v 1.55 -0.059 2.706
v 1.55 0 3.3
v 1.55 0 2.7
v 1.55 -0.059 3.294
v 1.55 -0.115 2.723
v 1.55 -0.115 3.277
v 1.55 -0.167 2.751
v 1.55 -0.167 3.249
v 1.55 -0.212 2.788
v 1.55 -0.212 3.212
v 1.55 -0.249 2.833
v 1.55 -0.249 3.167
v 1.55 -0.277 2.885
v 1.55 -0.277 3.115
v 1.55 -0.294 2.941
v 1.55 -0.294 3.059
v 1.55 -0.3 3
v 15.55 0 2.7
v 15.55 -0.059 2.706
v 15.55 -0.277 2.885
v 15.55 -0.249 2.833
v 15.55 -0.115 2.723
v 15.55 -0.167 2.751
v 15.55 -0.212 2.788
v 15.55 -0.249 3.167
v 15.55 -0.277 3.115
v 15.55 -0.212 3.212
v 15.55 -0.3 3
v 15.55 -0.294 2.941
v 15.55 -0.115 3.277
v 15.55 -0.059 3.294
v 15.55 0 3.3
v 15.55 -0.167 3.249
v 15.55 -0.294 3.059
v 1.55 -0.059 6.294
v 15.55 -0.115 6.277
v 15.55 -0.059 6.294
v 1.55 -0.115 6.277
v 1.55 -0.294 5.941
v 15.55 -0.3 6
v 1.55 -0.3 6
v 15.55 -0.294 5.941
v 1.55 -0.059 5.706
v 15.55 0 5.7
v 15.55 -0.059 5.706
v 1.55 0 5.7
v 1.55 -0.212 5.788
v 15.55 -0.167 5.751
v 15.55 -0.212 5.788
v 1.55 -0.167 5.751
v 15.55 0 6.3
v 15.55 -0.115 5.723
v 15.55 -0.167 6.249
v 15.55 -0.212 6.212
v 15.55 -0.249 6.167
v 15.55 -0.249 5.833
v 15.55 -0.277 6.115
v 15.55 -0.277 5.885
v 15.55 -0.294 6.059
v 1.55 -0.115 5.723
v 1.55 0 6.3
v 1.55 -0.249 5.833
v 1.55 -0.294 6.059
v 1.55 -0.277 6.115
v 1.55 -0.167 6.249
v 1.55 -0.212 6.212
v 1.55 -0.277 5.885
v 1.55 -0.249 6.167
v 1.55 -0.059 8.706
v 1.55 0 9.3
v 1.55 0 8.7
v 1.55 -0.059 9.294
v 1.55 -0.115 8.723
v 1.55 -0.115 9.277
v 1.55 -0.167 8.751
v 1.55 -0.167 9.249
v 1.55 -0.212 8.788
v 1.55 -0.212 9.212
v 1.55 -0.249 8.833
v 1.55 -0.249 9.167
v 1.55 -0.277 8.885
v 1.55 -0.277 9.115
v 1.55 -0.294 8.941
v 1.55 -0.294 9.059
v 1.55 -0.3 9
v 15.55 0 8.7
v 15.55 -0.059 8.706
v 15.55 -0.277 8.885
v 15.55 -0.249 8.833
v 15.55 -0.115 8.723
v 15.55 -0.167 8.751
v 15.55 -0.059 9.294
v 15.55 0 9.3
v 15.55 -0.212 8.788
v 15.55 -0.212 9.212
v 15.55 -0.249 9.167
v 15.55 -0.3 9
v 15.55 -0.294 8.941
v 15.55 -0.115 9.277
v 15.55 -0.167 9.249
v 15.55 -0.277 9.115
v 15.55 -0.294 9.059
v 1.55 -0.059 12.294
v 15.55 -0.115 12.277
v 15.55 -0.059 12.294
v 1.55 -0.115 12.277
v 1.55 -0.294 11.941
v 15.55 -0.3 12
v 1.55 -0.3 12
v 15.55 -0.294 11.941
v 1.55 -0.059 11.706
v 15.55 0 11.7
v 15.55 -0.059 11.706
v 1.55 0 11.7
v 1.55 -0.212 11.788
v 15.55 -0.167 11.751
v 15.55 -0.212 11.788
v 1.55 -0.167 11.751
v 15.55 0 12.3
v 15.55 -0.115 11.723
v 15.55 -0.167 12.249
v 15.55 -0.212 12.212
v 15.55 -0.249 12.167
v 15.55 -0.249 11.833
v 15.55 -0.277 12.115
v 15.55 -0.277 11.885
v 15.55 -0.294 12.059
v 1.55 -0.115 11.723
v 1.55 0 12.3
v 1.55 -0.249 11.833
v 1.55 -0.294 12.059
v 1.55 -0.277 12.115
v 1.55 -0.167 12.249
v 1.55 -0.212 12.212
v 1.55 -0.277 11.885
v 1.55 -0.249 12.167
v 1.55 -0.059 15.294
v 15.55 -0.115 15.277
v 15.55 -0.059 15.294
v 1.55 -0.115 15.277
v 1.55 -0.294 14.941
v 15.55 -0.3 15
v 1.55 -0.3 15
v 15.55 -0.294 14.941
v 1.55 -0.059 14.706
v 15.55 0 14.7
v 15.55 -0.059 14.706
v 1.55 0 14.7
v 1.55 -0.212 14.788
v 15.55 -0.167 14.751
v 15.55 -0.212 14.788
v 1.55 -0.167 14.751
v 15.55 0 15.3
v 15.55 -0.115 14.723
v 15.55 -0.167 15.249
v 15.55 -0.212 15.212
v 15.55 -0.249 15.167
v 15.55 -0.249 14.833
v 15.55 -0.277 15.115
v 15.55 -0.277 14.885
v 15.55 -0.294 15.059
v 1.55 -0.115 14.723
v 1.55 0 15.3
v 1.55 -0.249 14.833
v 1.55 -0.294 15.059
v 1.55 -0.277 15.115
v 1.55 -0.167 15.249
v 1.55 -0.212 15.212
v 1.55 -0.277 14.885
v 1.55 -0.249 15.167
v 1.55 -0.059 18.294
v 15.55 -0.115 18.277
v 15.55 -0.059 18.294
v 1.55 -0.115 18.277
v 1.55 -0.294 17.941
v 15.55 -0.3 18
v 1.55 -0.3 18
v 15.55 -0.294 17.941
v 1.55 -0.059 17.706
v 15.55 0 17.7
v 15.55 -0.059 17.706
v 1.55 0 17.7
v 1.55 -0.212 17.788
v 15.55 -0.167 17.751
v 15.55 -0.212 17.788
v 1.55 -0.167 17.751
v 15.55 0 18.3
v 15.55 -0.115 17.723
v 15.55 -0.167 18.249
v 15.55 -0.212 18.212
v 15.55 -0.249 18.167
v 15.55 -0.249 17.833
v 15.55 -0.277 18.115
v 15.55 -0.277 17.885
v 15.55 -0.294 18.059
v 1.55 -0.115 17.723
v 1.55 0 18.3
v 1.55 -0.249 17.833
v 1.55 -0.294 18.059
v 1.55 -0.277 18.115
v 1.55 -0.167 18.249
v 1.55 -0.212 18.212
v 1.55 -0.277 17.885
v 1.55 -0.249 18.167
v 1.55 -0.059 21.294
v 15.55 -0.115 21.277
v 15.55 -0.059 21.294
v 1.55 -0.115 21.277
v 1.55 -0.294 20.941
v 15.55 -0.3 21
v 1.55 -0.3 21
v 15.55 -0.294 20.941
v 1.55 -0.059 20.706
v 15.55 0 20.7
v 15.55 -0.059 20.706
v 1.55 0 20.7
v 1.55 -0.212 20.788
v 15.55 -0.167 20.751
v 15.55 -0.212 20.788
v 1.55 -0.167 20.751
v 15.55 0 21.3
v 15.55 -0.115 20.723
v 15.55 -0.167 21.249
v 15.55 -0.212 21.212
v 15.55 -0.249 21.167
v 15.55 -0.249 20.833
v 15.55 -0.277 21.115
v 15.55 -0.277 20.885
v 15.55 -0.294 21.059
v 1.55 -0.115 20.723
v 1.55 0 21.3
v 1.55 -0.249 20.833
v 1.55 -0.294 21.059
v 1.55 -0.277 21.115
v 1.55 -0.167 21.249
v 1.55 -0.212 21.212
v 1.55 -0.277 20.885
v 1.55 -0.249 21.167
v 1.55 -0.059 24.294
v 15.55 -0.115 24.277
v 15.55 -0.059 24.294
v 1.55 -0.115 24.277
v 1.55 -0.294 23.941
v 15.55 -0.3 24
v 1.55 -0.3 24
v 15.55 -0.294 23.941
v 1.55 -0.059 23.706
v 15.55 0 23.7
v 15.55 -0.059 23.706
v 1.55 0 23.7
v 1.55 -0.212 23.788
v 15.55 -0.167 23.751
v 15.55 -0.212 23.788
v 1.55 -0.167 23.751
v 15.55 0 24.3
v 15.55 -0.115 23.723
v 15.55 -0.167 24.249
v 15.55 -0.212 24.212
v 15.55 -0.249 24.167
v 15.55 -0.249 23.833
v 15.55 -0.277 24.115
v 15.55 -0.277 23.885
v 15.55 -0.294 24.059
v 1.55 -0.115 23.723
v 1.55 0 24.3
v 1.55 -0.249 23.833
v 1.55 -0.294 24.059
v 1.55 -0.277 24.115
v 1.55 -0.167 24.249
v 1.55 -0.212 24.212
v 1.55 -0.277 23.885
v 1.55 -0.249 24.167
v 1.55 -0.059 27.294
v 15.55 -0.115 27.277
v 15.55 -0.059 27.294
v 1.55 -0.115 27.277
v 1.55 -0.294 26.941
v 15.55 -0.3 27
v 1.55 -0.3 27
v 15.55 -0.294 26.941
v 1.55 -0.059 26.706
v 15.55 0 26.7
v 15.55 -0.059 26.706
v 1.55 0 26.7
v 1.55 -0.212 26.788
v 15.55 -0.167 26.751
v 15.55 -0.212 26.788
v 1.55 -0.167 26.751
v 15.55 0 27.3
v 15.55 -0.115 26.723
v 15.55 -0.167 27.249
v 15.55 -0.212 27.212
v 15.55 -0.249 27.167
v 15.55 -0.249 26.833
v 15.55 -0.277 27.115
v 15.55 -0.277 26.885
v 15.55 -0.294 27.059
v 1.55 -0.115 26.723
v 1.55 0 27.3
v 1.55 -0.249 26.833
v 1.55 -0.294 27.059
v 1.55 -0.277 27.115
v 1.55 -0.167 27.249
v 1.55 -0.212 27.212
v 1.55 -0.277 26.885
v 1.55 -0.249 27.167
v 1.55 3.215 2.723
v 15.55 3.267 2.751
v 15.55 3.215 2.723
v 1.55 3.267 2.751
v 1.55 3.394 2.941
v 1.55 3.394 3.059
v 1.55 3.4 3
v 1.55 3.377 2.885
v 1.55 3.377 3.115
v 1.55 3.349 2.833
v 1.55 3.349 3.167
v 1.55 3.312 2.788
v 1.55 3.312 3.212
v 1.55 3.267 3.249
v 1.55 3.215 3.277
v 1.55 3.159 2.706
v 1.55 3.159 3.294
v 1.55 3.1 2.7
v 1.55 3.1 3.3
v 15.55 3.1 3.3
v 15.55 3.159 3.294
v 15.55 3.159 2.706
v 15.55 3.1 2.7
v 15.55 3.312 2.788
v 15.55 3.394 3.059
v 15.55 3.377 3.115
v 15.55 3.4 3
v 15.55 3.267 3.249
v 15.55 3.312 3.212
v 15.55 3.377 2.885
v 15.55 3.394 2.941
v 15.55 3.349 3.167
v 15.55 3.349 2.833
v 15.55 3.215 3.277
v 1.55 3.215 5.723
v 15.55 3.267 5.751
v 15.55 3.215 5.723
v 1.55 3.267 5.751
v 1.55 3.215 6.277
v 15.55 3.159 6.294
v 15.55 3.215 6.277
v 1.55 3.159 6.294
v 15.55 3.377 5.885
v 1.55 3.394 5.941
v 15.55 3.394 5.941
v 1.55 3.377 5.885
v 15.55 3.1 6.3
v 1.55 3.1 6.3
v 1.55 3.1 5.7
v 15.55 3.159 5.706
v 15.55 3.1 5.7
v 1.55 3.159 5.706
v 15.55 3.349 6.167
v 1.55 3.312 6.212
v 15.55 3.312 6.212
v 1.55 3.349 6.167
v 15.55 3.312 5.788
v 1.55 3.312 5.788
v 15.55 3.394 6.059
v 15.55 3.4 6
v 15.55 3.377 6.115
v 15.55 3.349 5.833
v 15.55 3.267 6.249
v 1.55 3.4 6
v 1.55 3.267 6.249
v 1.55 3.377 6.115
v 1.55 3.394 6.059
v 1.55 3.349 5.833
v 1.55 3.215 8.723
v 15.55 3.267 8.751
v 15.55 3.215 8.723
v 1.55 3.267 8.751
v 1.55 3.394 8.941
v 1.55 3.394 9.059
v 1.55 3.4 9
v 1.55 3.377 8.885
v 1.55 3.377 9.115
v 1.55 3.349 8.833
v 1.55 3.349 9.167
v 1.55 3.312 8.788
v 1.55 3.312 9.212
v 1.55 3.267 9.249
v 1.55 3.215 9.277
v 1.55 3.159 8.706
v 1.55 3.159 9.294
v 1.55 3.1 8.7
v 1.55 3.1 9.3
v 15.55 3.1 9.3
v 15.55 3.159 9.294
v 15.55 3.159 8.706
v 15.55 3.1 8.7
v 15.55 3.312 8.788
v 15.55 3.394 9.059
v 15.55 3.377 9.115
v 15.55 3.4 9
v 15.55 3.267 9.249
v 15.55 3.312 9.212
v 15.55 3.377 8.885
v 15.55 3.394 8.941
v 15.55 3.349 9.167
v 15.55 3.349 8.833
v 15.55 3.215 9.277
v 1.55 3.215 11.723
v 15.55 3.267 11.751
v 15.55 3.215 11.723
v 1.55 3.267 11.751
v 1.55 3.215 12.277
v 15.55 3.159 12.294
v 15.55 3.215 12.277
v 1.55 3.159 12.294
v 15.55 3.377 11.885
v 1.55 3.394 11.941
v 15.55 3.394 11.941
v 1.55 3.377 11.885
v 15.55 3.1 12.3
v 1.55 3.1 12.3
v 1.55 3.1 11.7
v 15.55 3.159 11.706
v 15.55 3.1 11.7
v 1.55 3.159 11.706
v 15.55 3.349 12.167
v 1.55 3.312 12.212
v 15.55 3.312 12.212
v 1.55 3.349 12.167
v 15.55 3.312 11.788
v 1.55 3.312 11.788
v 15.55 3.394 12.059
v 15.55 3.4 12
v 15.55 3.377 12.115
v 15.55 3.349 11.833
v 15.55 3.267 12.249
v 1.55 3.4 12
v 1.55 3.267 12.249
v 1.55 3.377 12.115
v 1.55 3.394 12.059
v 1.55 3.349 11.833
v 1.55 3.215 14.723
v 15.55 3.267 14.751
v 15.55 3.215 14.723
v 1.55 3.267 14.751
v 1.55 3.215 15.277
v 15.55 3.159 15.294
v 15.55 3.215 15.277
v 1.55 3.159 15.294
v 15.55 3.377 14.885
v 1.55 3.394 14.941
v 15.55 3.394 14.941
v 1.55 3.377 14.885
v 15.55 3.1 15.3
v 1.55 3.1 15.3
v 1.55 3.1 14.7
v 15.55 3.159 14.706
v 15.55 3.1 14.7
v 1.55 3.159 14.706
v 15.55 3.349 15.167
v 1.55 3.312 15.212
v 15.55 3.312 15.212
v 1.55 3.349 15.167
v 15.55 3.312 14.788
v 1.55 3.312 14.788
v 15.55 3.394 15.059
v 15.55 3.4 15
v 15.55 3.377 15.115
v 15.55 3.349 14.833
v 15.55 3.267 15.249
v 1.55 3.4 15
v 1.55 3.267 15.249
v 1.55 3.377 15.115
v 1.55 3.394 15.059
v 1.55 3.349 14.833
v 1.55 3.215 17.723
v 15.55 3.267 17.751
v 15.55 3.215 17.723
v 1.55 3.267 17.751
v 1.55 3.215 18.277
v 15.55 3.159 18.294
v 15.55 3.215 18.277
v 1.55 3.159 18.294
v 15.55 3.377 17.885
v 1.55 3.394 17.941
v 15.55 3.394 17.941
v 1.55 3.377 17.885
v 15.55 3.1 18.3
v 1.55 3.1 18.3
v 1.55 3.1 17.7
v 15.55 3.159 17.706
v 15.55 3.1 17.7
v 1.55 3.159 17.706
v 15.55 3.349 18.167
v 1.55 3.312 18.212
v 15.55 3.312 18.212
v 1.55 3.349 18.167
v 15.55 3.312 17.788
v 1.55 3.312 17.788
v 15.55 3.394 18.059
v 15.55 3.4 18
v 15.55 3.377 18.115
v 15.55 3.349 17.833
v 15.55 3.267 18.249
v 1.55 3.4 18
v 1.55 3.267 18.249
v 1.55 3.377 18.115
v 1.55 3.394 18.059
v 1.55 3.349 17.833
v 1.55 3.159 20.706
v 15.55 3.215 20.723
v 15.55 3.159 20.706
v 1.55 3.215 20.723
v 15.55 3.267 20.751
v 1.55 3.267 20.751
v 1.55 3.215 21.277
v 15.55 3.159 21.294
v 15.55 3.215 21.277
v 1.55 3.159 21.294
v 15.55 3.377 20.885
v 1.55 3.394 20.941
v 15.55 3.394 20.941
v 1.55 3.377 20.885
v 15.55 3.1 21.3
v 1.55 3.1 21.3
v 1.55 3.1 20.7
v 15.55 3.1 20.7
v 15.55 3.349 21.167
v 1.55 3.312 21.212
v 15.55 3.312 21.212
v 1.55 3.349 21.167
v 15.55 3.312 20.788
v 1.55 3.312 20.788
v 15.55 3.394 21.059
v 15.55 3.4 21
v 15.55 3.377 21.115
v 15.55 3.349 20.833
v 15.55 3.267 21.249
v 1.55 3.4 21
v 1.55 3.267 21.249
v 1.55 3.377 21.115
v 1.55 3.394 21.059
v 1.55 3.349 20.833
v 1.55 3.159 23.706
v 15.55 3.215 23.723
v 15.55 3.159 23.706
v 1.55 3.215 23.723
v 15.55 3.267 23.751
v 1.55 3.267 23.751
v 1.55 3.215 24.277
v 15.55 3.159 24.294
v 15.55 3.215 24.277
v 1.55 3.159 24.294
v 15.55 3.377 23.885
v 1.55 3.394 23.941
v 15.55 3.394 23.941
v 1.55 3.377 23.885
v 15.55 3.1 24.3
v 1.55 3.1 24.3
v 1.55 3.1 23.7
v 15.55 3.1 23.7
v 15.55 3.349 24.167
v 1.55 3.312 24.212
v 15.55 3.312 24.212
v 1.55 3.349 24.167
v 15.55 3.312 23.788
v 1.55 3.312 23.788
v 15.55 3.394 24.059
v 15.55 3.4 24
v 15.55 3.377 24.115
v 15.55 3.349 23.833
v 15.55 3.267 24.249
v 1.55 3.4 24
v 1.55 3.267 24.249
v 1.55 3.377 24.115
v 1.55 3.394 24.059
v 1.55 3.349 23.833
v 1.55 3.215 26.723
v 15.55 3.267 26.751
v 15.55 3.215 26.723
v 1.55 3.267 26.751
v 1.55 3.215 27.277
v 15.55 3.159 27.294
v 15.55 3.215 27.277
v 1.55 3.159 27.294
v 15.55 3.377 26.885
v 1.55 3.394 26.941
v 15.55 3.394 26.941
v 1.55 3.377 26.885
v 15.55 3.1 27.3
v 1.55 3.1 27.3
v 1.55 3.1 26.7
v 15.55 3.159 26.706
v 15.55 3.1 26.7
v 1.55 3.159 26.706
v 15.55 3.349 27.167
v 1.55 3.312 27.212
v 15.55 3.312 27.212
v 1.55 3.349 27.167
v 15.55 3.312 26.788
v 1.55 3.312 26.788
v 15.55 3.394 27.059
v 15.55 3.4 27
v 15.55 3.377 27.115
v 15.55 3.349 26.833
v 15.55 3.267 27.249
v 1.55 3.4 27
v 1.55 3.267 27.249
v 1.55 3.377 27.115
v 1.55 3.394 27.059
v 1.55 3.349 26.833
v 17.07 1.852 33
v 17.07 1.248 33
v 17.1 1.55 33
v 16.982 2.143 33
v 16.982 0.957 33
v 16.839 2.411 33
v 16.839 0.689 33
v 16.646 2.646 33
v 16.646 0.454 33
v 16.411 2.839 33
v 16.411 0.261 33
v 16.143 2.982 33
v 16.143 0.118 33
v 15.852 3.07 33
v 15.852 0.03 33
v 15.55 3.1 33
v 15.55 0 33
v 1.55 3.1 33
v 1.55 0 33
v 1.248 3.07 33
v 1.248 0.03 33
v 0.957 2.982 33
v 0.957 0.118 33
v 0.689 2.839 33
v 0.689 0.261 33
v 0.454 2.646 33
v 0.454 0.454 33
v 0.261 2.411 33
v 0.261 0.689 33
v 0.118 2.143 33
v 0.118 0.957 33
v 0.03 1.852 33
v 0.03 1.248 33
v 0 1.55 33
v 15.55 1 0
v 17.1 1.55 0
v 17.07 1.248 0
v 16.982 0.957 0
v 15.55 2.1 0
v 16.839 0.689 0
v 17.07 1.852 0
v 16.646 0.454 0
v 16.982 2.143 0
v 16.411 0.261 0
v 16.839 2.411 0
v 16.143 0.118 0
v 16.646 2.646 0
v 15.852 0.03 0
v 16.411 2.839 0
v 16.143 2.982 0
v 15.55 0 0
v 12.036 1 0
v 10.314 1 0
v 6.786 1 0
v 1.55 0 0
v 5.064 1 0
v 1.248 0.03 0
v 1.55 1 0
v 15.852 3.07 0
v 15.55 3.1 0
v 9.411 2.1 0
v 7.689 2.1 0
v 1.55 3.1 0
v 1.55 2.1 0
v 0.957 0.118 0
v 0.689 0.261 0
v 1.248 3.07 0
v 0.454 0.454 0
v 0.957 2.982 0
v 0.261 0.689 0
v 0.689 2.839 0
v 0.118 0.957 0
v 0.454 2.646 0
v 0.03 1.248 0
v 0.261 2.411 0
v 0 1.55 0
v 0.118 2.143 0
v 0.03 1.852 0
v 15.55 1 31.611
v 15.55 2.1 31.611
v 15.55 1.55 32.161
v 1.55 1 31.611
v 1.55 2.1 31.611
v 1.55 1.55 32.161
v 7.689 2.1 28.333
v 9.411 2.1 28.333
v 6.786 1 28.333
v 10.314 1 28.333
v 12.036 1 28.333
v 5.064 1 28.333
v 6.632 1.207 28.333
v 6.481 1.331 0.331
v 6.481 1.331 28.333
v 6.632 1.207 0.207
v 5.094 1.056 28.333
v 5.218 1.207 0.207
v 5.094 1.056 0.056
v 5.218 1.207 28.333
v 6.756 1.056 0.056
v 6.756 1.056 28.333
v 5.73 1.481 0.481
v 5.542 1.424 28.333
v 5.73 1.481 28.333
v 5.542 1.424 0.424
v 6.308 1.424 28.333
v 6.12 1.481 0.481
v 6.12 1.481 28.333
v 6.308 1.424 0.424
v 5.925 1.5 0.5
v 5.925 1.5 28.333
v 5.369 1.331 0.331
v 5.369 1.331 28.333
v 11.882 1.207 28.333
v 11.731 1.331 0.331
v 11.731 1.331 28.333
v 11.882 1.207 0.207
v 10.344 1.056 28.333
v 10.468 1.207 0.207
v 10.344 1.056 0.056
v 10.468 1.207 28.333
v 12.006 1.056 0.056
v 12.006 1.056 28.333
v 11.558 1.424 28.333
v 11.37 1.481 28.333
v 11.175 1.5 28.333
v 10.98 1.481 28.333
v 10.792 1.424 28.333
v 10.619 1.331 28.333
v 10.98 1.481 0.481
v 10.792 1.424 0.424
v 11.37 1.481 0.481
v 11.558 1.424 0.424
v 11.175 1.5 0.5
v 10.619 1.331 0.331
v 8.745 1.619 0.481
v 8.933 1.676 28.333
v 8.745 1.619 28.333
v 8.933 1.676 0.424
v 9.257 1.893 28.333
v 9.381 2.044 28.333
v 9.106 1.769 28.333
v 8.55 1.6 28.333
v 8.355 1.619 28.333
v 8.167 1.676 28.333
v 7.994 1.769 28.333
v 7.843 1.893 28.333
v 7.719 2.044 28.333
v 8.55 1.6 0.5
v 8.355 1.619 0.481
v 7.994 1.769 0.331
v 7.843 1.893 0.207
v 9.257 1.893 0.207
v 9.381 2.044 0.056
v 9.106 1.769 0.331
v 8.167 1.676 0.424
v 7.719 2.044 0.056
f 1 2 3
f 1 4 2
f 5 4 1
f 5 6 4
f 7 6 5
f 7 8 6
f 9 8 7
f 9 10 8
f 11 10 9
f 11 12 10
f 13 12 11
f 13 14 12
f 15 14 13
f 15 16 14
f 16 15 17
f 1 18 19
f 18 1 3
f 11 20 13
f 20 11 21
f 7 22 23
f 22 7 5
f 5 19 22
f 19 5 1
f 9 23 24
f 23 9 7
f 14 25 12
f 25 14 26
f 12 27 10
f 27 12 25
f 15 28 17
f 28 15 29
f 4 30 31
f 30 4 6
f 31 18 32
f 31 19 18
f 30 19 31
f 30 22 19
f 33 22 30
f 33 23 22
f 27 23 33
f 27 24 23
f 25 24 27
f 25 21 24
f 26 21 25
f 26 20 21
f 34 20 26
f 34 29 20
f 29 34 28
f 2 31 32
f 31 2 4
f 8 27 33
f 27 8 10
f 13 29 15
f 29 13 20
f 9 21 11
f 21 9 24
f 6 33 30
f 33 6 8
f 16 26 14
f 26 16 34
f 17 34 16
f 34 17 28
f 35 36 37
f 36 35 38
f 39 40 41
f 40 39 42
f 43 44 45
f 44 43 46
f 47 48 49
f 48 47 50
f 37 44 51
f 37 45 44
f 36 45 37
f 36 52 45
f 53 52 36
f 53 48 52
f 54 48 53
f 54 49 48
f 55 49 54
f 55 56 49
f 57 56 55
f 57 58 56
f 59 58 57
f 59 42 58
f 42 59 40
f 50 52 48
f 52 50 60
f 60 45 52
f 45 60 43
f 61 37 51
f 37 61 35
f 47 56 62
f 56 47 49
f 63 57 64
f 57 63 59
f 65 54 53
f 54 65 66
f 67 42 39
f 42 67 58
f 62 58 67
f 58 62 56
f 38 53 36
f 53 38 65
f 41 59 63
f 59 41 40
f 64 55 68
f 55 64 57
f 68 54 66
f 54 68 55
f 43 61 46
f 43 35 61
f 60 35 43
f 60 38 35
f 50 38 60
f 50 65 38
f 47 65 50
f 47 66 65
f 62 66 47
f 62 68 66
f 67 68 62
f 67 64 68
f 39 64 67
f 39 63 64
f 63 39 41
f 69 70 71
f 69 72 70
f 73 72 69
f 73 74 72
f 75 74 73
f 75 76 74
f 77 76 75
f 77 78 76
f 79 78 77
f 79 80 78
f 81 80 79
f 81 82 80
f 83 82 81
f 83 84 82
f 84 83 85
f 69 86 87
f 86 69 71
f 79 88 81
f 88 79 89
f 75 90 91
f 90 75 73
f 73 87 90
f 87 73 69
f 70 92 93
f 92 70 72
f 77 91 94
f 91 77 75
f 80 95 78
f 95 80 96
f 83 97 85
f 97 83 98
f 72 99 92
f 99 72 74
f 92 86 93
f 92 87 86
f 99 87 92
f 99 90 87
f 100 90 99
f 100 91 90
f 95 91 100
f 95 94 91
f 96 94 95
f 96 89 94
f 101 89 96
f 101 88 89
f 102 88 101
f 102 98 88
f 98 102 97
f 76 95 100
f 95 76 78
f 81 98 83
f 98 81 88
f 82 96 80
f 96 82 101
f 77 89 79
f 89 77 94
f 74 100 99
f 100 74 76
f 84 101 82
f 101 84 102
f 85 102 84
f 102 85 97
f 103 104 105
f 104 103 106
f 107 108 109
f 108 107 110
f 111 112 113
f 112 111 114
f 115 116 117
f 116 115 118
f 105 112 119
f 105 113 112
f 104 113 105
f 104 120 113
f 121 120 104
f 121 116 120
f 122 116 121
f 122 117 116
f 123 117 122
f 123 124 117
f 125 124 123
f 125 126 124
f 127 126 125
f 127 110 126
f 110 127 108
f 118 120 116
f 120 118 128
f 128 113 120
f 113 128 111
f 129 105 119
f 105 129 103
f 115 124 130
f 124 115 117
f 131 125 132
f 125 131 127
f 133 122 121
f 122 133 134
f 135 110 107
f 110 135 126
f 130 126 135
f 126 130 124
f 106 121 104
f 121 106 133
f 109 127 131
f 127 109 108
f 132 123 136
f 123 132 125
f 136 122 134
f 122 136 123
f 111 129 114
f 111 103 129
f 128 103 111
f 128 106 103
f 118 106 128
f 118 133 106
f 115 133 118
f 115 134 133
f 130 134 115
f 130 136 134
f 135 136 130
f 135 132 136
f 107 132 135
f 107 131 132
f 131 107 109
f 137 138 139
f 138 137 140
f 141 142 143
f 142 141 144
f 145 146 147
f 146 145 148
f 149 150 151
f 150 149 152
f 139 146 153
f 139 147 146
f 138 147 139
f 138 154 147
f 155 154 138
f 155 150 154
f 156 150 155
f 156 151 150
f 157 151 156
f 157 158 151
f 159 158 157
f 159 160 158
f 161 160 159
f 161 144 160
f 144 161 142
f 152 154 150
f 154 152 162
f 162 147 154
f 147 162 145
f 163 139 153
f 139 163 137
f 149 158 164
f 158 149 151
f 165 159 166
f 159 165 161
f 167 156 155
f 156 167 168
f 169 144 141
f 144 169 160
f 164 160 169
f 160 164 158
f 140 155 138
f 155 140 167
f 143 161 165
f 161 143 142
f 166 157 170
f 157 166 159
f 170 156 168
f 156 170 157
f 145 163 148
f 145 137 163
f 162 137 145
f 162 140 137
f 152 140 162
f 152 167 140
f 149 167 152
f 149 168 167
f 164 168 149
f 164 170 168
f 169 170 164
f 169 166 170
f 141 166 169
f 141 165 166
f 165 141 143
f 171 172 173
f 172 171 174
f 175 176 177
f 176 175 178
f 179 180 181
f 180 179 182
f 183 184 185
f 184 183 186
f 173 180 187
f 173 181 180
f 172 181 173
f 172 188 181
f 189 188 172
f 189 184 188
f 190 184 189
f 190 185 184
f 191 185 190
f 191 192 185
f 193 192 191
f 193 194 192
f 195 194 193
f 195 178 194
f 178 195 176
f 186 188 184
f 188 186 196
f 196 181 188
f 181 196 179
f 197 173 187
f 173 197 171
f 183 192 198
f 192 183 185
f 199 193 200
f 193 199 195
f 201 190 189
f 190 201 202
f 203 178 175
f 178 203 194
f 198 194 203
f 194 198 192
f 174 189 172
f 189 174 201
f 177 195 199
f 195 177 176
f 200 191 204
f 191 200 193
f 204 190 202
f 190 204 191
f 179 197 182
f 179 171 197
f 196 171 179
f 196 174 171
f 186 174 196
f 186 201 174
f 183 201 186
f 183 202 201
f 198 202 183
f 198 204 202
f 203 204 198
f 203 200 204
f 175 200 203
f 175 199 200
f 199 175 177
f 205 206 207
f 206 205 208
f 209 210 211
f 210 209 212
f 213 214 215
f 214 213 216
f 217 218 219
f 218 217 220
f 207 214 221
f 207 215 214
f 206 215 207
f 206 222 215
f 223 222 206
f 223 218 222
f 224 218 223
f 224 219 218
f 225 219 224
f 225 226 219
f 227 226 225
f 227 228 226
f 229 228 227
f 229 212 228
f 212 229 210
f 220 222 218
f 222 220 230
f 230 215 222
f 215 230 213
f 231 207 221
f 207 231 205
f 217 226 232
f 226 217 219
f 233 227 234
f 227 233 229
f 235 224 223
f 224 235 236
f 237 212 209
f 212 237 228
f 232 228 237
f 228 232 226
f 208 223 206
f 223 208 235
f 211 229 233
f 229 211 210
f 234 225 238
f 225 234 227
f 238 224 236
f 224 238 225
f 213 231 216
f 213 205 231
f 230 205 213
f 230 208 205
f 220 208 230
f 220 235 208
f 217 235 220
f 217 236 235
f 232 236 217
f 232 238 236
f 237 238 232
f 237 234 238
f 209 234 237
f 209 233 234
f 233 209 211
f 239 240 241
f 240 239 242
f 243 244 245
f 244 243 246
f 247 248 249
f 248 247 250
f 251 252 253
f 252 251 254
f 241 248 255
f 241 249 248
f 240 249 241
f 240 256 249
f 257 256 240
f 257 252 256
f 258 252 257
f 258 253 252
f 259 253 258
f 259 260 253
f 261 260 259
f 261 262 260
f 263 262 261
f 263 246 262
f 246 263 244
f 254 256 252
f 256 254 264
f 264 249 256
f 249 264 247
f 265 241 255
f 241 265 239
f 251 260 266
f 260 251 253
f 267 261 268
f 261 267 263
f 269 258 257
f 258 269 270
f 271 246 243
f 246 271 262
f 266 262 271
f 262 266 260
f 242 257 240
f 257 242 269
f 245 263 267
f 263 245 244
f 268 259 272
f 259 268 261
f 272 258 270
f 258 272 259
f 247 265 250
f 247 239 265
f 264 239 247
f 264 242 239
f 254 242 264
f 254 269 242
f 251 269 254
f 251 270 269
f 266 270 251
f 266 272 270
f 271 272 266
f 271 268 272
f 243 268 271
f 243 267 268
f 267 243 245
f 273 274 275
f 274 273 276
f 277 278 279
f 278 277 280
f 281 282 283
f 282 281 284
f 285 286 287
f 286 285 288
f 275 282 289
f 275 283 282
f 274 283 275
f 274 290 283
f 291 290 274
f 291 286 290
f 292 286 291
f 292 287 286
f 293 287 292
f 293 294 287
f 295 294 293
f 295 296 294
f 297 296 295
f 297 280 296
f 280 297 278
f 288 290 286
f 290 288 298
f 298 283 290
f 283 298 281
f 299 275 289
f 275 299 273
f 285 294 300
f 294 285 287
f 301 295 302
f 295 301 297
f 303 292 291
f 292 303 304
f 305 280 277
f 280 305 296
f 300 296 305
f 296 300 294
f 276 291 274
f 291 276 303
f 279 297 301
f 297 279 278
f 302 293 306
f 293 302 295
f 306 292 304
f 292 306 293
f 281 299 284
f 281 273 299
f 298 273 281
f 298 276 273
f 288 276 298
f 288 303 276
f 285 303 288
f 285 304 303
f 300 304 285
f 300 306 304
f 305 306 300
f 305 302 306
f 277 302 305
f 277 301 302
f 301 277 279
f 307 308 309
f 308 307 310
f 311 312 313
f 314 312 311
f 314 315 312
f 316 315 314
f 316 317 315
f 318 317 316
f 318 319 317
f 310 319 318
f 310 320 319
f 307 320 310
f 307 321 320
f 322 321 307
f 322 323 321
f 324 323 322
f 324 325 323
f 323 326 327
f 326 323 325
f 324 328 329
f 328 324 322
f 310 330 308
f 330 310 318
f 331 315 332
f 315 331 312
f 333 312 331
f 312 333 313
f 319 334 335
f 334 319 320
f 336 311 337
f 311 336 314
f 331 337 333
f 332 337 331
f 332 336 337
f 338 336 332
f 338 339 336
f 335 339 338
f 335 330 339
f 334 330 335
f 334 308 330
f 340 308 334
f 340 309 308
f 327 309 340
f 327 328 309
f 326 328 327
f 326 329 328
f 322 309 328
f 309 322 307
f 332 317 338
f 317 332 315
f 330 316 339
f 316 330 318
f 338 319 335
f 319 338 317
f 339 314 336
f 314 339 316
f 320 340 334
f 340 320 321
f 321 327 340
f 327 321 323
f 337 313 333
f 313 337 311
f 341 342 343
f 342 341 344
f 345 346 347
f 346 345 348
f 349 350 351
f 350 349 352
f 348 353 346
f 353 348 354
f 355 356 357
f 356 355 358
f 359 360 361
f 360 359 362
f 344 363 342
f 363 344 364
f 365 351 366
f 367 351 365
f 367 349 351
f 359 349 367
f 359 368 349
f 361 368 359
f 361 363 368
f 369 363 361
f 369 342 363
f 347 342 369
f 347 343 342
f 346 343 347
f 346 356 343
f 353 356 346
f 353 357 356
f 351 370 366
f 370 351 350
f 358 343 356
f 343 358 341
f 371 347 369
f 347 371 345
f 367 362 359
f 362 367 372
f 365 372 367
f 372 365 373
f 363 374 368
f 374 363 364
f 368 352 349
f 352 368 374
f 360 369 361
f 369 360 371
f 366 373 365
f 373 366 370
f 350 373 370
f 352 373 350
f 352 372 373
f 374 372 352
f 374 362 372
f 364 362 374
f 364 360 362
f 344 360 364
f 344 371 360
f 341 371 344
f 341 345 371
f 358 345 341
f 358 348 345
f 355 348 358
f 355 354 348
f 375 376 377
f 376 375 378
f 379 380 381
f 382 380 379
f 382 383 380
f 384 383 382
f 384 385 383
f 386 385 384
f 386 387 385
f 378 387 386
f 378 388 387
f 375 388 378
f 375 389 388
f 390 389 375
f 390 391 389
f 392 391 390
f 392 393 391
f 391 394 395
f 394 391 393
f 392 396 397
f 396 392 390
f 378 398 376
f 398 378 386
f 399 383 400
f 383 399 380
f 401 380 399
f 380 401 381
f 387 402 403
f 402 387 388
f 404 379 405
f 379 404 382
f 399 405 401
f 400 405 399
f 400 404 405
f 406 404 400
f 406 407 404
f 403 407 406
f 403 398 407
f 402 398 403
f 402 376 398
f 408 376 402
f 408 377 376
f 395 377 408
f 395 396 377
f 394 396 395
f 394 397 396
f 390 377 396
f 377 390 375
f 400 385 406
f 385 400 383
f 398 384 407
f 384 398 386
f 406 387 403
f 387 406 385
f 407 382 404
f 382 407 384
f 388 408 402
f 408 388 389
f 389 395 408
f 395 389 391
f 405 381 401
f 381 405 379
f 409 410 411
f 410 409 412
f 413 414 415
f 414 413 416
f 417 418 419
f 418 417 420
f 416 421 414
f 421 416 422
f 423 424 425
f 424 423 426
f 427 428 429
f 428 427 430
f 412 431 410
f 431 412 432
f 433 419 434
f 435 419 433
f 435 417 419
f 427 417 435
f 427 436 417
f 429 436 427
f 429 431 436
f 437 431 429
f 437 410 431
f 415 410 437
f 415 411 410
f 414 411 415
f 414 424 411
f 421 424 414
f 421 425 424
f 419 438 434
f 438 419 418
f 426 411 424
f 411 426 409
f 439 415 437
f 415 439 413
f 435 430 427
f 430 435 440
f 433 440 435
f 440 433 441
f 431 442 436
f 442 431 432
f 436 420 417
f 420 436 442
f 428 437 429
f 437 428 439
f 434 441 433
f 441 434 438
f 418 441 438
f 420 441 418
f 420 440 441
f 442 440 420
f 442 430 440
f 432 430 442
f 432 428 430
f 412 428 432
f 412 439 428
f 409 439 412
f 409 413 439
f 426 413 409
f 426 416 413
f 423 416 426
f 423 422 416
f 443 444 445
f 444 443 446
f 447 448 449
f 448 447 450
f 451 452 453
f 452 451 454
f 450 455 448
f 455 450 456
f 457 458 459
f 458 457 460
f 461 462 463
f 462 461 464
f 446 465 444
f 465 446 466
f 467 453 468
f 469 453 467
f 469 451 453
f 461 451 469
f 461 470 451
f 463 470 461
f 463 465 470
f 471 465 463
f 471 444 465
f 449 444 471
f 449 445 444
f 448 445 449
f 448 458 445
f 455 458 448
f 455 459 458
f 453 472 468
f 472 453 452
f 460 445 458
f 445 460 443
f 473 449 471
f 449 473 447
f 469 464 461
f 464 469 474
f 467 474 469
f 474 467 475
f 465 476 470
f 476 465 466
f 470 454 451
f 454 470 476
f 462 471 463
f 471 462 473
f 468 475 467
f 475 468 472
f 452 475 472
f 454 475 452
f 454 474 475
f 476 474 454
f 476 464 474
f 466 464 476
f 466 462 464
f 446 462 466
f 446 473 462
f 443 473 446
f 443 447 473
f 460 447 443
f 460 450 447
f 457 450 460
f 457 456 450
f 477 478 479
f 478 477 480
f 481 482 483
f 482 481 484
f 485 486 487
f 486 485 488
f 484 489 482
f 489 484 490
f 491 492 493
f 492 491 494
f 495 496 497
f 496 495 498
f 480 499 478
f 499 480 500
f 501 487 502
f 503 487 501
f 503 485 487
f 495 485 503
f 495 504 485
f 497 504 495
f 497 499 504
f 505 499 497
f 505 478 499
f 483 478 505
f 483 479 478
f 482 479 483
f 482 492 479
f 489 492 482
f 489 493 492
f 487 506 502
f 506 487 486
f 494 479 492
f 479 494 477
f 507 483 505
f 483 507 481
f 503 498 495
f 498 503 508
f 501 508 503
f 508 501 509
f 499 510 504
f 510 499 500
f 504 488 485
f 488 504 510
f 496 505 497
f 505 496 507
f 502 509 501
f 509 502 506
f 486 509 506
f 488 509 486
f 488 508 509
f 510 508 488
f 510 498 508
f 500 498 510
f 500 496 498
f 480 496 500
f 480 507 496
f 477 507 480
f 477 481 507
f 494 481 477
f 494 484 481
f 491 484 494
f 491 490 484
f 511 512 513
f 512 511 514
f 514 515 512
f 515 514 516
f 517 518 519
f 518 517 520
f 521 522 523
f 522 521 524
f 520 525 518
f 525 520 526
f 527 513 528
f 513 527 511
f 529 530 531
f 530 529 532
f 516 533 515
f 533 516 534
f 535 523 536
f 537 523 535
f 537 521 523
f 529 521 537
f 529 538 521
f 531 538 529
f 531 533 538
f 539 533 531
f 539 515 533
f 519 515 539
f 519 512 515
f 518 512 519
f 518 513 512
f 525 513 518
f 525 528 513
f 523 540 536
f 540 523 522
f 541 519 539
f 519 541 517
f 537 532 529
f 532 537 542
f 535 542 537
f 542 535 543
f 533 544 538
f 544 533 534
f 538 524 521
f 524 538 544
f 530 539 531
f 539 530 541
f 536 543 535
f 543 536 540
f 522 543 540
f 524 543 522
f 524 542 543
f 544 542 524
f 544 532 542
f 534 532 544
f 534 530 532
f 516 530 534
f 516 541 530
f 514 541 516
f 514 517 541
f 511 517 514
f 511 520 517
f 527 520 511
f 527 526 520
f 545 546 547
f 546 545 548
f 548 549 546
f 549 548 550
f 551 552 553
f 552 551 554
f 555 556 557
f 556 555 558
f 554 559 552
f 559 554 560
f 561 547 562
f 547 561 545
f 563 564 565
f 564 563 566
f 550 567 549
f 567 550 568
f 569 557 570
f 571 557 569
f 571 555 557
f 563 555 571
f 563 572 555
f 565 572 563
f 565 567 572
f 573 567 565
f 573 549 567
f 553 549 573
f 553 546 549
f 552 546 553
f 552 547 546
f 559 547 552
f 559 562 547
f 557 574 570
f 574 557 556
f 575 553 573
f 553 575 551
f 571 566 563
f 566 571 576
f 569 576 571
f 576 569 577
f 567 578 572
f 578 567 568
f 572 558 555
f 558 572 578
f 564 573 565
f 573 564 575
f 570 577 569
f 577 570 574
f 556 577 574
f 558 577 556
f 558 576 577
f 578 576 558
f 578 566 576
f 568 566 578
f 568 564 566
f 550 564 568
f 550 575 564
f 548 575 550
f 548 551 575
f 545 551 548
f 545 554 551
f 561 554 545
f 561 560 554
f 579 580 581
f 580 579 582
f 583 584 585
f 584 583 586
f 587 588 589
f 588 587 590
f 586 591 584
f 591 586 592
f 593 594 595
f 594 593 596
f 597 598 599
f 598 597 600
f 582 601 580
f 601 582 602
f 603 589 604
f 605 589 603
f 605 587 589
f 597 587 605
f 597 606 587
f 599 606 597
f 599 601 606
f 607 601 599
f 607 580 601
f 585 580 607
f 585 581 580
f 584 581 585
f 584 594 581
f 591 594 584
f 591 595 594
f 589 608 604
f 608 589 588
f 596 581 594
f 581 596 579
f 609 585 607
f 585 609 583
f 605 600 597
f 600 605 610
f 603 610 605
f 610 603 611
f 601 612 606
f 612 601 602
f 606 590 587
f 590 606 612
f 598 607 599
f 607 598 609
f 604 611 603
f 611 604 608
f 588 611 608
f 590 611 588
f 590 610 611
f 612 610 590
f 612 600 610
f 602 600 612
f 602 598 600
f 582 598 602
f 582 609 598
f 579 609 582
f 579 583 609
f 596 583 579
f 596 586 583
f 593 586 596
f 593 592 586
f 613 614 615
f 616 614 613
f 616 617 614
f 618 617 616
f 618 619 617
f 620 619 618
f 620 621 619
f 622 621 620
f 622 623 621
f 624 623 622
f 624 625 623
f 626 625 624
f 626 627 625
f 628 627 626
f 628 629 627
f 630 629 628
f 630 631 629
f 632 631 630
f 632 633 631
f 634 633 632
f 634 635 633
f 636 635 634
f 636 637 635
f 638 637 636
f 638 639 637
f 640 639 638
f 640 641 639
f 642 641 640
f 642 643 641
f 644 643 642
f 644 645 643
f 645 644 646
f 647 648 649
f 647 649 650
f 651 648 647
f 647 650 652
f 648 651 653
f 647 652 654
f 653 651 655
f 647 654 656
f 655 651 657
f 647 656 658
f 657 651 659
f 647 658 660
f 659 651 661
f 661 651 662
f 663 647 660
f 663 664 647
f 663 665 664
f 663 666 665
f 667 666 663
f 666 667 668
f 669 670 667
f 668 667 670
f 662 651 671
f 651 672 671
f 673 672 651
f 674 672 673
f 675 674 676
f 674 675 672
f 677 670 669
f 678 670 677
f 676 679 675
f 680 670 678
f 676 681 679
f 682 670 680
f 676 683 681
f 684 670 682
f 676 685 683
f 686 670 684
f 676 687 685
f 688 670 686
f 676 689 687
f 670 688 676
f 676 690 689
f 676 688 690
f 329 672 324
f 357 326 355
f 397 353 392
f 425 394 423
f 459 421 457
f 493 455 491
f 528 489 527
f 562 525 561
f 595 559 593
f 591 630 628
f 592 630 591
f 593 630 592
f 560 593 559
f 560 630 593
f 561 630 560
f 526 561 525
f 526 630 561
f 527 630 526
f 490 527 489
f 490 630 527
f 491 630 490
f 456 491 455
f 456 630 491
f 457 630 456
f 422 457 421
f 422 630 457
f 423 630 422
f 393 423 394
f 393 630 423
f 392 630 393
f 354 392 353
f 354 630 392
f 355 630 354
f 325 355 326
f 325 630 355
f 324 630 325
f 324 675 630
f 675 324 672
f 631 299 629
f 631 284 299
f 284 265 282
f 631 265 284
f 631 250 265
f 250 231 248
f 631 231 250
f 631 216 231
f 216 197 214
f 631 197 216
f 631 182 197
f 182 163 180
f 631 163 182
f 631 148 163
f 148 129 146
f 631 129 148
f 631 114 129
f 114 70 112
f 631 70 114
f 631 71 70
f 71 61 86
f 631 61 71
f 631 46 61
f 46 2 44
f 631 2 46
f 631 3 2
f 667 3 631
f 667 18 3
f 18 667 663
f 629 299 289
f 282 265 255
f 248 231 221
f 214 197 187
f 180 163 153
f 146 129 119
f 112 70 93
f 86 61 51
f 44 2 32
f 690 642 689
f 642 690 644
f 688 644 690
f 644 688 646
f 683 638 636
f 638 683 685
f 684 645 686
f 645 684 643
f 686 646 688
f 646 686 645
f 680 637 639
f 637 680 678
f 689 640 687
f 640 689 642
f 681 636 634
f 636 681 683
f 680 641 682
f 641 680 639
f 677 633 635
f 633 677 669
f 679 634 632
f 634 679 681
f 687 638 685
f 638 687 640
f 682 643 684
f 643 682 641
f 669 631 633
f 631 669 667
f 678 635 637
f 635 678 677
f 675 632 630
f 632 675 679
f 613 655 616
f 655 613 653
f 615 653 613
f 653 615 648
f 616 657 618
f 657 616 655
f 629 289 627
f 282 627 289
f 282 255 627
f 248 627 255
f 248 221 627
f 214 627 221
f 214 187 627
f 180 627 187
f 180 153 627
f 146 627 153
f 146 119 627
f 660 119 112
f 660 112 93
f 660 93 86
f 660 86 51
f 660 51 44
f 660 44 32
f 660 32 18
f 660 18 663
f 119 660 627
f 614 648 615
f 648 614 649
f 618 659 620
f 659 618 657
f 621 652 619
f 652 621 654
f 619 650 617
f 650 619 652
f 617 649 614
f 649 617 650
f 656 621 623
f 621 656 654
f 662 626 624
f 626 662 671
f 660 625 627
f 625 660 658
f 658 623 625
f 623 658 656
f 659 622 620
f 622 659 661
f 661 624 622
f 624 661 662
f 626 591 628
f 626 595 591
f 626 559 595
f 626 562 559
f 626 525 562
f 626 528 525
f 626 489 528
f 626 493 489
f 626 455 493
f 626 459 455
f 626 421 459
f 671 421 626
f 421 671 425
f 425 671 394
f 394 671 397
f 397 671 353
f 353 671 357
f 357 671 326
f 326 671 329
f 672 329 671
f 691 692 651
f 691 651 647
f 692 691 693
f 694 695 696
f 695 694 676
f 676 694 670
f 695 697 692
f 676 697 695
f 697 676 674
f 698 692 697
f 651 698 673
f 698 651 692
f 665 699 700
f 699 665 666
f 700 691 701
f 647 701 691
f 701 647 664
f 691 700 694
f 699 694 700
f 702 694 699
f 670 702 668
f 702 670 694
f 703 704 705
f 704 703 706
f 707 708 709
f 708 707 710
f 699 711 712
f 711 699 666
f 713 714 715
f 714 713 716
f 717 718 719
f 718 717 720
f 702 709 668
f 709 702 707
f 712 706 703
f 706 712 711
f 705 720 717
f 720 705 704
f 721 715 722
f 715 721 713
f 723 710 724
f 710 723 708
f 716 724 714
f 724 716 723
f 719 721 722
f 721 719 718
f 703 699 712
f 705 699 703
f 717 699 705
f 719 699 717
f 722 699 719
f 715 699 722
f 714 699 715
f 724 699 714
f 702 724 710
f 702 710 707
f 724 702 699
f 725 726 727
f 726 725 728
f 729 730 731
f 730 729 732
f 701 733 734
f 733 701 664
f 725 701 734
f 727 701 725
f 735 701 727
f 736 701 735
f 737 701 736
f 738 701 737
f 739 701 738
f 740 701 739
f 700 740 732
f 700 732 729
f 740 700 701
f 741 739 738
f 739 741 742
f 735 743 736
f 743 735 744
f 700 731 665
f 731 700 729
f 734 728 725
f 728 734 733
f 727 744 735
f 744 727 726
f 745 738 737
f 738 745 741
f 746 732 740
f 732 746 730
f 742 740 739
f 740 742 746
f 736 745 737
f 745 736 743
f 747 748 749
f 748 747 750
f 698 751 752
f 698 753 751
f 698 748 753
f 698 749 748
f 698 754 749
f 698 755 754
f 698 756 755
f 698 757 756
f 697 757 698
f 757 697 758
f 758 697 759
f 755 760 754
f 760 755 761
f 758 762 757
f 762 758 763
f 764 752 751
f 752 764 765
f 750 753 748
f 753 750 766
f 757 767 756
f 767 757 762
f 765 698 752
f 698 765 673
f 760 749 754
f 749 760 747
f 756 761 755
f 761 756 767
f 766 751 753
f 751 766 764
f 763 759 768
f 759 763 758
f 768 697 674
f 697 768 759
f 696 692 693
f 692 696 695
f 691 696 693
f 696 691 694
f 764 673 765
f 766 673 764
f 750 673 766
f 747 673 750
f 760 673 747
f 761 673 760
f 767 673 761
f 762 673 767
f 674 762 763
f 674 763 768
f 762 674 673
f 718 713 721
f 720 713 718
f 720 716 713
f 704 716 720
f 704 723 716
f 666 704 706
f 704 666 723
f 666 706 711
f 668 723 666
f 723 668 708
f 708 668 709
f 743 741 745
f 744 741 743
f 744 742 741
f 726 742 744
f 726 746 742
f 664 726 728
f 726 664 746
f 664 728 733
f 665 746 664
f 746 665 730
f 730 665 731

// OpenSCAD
// Blade size
thickness = 0.5;
length = 32;
width = 14; // Set 2 mm wider than actual width

// Wall thickness
wall = 1;

// Inserting the blade into the sheeth will push
// the wall out by this amount.
pressure_height = 0.2;

$fn=32;

room = 0.3;

module blade_hole()
{
    // Radius of the pressure bars
    pressure_r = 1;

    union() {
        difference() {
            cube([width, thickness+room*2, length-(thickness+room*2)/sqrt(2)/2]);
     
            translate([width*5/16, -(pressure_r-room-pressure_height), 0])
                cylinder(r=pressure_r, h=length-width/3+1);
            translate([width*11/16, -(pressure_r-room-pressure_height), 0])
                cylinder(r=pressure_r, h=length-width/3+1);
            
            translate([width/2, room+thickness-pressure_height+pressure_r, 0])
                cylinder(r=pressure_r, h=length-width/3+1);
            
        }
        translate([0, 0, length-(thickness+room*2)/sqrt(2)/2])
            rotate([-45, 0, 0])
                cube([width, (thickness+room*2)/sqrt(2), (thickness+room*2)/sqrt(2)]);
        rotate([-45, 0, 0])
            cube([width, (thickness+room*2)/sqrt(2), (thickness+room*2)/sqrt(2)]);
    }
}

module sheath()
{
    off = wall+room+thickness/2;
    difference()
    {
        union() {
            translate([off, 0, 0])
            cube([width, 2*off, length+wall]);
            translate([off, 0, 0])
                grip();
            translate([off, 2*off, 0])
                grip();
            
            translate([off, off, 0])
                cylinder(r=off, h=length+wall);
            translate([width+off, wall+room+thickness/2, 0])
                cylinder(r=off, h=length+wall);
        }
        
        translate([off, wall, 0])
            blade_hole();
    }
    
}

module grip()
{
    for(i = [3:3:length+wall-6]) {
        translate([0, 0, i])
            rotate([0, 90, 0])
                cylinder(r=0.3, h=width);
    }
}

sheath();
//blade_hole();
